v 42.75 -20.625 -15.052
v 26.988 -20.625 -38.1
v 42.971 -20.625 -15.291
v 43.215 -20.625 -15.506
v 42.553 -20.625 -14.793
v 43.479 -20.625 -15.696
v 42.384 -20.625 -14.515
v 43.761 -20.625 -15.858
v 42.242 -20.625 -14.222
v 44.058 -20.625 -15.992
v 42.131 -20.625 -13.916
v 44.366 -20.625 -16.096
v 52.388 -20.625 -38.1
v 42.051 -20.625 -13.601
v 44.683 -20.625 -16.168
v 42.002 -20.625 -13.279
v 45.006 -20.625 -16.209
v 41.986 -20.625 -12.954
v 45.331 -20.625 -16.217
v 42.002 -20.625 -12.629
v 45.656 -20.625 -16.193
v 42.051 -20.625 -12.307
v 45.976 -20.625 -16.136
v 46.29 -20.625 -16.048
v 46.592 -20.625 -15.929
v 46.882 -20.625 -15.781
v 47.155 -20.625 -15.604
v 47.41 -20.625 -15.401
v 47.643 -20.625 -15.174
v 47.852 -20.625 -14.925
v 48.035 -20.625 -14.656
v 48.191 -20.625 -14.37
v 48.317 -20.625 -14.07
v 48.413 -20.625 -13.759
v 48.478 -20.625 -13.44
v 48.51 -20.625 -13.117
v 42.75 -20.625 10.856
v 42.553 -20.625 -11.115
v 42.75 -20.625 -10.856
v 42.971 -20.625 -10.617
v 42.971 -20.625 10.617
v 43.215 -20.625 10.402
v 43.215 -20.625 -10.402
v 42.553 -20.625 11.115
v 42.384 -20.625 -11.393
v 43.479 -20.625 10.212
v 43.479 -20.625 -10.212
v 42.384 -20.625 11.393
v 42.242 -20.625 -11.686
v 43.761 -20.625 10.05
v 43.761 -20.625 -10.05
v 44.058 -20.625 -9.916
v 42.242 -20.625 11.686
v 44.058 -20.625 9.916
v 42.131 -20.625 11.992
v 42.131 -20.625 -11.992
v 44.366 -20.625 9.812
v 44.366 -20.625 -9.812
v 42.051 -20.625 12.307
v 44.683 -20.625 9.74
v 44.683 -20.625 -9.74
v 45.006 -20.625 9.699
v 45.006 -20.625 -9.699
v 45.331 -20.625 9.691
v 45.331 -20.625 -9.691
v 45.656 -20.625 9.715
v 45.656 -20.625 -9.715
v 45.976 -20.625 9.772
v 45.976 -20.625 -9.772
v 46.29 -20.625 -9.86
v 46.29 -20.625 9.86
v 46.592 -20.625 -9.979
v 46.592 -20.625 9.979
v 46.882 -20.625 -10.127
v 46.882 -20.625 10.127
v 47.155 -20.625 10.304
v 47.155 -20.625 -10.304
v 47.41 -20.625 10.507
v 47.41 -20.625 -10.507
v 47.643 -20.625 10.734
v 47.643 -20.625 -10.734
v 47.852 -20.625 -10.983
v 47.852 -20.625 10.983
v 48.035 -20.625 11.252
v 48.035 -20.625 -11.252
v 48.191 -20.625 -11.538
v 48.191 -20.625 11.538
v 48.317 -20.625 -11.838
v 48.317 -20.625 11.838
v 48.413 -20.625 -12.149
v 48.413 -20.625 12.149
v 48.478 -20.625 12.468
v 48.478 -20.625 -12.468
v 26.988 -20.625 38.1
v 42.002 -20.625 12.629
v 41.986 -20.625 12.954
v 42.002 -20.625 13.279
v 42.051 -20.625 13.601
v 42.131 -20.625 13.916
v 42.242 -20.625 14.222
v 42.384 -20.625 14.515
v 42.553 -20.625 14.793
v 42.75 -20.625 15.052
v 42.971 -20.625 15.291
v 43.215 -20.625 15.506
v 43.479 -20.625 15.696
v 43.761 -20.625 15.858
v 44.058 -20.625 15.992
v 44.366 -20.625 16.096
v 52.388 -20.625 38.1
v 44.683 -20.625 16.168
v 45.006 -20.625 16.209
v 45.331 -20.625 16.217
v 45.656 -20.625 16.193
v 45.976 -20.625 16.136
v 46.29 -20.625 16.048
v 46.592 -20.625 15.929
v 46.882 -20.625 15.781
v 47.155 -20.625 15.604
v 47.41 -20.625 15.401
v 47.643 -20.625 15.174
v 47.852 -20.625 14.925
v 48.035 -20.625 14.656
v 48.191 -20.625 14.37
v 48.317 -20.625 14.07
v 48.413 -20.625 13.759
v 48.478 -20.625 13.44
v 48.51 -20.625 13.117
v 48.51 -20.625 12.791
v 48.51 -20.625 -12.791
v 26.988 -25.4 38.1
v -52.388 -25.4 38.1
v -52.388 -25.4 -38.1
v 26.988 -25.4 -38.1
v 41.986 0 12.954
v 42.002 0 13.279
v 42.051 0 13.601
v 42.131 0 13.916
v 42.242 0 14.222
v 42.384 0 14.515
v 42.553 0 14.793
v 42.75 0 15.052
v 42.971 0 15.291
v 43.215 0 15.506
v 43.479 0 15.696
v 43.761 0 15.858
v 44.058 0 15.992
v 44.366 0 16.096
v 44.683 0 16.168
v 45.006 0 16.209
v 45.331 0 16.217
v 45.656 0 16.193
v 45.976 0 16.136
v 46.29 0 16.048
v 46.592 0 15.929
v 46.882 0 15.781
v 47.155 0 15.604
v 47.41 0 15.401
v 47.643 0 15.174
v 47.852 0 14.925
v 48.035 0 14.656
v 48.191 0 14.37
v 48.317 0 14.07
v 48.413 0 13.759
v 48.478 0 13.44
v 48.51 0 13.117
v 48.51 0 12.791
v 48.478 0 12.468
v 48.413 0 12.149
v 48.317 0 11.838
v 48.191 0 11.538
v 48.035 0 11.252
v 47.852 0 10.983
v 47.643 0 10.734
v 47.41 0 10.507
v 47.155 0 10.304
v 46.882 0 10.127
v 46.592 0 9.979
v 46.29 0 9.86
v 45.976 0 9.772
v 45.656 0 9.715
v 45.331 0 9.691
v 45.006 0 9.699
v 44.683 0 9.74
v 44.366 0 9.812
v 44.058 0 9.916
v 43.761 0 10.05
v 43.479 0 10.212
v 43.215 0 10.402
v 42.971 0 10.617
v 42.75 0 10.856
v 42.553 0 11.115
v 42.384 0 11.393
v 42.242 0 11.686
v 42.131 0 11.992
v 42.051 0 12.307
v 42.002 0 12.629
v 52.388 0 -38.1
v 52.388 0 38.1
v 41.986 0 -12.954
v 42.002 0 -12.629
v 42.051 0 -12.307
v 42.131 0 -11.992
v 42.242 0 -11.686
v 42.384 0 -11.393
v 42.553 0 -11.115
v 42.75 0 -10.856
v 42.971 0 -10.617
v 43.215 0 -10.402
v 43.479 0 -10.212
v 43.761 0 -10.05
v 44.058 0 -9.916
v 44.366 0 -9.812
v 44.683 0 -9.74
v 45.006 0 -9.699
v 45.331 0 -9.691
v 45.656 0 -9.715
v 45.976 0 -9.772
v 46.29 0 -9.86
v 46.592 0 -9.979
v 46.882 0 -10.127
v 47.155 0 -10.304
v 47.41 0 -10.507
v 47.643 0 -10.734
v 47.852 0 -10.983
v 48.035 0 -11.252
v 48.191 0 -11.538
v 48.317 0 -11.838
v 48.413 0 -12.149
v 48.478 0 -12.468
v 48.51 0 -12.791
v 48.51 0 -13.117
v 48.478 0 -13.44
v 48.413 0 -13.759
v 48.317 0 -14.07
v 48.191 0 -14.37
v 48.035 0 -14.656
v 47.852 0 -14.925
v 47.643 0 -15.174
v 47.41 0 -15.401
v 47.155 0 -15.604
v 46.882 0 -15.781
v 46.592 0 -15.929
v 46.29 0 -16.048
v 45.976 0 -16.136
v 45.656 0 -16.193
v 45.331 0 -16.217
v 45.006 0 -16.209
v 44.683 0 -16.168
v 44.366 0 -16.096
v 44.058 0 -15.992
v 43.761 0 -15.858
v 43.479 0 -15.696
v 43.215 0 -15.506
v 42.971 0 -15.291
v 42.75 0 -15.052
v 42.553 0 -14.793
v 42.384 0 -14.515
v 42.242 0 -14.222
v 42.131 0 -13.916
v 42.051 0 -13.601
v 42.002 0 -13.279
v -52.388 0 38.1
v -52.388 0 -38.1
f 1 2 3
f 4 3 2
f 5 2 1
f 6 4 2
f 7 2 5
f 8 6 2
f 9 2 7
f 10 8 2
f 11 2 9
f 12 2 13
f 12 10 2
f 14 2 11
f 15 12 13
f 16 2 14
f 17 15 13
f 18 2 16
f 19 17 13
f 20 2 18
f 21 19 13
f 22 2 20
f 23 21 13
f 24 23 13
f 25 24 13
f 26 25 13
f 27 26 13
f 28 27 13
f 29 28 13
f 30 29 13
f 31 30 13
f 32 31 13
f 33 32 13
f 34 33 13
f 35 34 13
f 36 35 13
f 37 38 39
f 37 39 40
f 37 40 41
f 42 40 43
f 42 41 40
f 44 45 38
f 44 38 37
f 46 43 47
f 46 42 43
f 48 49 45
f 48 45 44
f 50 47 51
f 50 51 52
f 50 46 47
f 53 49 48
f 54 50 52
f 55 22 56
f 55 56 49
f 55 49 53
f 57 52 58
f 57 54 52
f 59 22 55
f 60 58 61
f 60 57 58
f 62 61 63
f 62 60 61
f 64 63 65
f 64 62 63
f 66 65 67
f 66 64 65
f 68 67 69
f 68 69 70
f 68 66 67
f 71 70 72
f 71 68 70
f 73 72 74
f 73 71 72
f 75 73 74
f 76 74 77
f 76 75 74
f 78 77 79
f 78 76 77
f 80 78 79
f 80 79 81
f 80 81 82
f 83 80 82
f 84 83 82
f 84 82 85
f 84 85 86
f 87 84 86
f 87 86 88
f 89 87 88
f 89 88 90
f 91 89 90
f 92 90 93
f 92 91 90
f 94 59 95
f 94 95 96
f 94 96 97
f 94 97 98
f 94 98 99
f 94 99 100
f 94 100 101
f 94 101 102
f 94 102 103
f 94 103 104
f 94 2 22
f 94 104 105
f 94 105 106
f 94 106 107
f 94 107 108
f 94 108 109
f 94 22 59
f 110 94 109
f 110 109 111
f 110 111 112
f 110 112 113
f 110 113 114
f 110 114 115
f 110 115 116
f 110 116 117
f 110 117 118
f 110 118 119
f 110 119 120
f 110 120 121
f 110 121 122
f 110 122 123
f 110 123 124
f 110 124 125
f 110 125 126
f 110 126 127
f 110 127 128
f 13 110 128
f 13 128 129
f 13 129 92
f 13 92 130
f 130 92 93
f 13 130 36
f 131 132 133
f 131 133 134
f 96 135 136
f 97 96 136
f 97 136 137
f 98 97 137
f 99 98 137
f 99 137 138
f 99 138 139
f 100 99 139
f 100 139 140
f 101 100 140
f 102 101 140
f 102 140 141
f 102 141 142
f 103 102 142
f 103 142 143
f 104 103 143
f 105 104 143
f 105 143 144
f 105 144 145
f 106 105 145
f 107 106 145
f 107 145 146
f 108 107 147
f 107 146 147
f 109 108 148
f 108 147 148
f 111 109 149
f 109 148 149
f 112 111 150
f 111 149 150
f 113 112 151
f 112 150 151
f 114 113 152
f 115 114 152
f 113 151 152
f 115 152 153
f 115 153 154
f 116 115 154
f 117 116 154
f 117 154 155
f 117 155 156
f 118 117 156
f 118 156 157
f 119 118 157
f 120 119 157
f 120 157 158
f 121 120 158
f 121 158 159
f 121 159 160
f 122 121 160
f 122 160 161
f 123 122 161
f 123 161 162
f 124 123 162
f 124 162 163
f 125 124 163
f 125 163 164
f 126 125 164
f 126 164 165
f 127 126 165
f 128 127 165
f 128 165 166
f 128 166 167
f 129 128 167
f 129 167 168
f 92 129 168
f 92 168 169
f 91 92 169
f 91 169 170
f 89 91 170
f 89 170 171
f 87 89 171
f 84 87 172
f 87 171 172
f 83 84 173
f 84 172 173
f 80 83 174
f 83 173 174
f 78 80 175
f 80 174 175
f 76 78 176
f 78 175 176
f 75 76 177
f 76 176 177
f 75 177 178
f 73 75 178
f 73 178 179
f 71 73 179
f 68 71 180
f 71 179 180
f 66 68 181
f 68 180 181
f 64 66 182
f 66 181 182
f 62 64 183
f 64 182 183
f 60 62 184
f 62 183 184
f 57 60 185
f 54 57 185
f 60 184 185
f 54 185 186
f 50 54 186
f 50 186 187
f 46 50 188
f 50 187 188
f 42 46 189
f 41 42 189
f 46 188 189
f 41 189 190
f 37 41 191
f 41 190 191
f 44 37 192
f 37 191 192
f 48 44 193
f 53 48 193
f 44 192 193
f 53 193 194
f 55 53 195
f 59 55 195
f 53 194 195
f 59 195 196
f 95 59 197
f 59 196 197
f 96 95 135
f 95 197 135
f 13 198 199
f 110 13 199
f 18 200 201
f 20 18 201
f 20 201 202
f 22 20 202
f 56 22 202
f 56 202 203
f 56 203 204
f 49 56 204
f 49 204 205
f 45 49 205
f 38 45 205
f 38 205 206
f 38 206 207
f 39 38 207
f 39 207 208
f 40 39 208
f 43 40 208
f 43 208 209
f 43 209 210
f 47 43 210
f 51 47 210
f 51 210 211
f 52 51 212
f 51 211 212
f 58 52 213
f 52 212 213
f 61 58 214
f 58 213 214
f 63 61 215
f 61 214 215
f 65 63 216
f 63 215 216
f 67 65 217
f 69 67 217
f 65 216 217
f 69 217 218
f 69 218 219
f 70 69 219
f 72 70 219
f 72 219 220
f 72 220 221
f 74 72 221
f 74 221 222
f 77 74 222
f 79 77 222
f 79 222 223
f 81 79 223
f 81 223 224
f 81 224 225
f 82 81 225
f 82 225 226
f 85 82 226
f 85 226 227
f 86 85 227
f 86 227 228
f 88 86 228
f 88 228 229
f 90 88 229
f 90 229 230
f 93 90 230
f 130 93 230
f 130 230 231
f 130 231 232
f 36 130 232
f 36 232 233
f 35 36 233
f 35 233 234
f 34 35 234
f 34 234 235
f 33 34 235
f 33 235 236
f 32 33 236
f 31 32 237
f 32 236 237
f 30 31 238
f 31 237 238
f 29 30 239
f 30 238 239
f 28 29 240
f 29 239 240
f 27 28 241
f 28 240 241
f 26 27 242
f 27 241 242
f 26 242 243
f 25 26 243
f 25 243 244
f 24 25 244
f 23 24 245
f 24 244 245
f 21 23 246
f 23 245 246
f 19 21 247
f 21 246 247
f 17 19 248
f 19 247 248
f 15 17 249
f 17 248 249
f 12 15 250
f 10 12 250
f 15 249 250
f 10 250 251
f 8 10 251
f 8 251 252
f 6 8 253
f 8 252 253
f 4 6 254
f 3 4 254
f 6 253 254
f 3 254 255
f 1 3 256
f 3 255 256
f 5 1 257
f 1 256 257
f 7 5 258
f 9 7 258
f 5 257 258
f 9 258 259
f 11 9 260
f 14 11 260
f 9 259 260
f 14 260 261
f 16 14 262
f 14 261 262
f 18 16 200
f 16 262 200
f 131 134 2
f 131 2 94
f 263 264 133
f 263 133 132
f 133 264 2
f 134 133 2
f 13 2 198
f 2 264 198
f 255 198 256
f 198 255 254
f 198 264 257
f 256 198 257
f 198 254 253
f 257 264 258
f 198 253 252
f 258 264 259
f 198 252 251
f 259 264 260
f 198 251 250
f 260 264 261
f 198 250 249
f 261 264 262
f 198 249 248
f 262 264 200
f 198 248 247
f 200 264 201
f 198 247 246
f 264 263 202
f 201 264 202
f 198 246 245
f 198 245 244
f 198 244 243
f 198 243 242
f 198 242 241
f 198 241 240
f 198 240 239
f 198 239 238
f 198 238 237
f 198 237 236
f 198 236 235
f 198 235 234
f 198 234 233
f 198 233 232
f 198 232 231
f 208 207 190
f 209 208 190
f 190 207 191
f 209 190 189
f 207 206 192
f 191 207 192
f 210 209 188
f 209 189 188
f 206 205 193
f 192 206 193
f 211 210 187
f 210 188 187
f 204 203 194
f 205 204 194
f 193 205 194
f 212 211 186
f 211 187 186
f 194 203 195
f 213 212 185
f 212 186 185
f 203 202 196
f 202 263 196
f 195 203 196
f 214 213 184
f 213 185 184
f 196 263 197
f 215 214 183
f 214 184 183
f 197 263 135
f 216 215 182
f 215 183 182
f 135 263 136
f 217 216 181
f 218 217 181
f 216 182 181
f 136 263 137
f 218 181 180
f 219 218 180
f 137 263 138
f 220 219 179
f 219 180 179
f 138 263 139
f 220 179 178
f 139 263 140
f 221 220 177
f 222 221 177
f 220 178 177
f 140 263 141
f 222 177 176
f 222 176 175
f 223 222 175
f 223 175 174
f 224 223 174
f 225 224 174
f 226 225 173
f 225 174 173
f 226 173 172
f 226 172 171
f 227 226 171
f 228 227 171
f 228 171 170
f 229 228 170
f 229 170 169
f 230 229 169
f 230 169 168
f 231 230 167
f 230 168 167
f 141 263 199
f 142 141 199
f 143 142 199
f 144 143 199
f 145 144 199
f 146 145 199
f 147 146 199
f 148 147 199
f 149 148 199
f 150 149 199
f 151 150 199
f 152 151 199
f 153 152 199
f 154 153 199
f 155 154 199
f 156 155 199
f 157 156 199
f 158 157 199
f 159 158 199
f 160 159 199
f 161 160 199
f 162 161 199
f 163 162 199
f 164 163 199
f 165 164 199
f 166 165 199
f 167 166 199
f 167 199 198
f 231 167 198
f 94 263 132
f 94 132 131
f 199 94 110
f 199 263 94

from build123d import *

# Parameters (mm, degrees)
F0_W     = 104.775
F0_H     = 76.2
F1_DEPTH = 25.4
F2_W     = 25.4
F2_H     = 76.2
F3_DEPTH = 4.7752
F5_D     = 6.5278


with BuildPart() as f1:
    # F0 (on Front) → F1 (new body)
    with BuildSketch(Plane.XZ):
        Rectangle(F0_W, F0_H)
    extrude(amount=F1_DEPTH)

    # F2 (on face) → F3 (cut)
    with BuildSketch(Plane.XZ.offset(25.4)):
        with Locations((39.6875, 0)):
            Rectangle(F2_W, F2_H)
    extrude(amount=-F3_DEPTH, mode=Mode.SUBTRACT)

    # F5 (through all)
    with Locations(Plane.XZ.offset(20.6248)):
        with Locations((45.2501, -12.954), (45.2501, 12.954)):
            Hole(F5_D / 2)


solid = f1.part
